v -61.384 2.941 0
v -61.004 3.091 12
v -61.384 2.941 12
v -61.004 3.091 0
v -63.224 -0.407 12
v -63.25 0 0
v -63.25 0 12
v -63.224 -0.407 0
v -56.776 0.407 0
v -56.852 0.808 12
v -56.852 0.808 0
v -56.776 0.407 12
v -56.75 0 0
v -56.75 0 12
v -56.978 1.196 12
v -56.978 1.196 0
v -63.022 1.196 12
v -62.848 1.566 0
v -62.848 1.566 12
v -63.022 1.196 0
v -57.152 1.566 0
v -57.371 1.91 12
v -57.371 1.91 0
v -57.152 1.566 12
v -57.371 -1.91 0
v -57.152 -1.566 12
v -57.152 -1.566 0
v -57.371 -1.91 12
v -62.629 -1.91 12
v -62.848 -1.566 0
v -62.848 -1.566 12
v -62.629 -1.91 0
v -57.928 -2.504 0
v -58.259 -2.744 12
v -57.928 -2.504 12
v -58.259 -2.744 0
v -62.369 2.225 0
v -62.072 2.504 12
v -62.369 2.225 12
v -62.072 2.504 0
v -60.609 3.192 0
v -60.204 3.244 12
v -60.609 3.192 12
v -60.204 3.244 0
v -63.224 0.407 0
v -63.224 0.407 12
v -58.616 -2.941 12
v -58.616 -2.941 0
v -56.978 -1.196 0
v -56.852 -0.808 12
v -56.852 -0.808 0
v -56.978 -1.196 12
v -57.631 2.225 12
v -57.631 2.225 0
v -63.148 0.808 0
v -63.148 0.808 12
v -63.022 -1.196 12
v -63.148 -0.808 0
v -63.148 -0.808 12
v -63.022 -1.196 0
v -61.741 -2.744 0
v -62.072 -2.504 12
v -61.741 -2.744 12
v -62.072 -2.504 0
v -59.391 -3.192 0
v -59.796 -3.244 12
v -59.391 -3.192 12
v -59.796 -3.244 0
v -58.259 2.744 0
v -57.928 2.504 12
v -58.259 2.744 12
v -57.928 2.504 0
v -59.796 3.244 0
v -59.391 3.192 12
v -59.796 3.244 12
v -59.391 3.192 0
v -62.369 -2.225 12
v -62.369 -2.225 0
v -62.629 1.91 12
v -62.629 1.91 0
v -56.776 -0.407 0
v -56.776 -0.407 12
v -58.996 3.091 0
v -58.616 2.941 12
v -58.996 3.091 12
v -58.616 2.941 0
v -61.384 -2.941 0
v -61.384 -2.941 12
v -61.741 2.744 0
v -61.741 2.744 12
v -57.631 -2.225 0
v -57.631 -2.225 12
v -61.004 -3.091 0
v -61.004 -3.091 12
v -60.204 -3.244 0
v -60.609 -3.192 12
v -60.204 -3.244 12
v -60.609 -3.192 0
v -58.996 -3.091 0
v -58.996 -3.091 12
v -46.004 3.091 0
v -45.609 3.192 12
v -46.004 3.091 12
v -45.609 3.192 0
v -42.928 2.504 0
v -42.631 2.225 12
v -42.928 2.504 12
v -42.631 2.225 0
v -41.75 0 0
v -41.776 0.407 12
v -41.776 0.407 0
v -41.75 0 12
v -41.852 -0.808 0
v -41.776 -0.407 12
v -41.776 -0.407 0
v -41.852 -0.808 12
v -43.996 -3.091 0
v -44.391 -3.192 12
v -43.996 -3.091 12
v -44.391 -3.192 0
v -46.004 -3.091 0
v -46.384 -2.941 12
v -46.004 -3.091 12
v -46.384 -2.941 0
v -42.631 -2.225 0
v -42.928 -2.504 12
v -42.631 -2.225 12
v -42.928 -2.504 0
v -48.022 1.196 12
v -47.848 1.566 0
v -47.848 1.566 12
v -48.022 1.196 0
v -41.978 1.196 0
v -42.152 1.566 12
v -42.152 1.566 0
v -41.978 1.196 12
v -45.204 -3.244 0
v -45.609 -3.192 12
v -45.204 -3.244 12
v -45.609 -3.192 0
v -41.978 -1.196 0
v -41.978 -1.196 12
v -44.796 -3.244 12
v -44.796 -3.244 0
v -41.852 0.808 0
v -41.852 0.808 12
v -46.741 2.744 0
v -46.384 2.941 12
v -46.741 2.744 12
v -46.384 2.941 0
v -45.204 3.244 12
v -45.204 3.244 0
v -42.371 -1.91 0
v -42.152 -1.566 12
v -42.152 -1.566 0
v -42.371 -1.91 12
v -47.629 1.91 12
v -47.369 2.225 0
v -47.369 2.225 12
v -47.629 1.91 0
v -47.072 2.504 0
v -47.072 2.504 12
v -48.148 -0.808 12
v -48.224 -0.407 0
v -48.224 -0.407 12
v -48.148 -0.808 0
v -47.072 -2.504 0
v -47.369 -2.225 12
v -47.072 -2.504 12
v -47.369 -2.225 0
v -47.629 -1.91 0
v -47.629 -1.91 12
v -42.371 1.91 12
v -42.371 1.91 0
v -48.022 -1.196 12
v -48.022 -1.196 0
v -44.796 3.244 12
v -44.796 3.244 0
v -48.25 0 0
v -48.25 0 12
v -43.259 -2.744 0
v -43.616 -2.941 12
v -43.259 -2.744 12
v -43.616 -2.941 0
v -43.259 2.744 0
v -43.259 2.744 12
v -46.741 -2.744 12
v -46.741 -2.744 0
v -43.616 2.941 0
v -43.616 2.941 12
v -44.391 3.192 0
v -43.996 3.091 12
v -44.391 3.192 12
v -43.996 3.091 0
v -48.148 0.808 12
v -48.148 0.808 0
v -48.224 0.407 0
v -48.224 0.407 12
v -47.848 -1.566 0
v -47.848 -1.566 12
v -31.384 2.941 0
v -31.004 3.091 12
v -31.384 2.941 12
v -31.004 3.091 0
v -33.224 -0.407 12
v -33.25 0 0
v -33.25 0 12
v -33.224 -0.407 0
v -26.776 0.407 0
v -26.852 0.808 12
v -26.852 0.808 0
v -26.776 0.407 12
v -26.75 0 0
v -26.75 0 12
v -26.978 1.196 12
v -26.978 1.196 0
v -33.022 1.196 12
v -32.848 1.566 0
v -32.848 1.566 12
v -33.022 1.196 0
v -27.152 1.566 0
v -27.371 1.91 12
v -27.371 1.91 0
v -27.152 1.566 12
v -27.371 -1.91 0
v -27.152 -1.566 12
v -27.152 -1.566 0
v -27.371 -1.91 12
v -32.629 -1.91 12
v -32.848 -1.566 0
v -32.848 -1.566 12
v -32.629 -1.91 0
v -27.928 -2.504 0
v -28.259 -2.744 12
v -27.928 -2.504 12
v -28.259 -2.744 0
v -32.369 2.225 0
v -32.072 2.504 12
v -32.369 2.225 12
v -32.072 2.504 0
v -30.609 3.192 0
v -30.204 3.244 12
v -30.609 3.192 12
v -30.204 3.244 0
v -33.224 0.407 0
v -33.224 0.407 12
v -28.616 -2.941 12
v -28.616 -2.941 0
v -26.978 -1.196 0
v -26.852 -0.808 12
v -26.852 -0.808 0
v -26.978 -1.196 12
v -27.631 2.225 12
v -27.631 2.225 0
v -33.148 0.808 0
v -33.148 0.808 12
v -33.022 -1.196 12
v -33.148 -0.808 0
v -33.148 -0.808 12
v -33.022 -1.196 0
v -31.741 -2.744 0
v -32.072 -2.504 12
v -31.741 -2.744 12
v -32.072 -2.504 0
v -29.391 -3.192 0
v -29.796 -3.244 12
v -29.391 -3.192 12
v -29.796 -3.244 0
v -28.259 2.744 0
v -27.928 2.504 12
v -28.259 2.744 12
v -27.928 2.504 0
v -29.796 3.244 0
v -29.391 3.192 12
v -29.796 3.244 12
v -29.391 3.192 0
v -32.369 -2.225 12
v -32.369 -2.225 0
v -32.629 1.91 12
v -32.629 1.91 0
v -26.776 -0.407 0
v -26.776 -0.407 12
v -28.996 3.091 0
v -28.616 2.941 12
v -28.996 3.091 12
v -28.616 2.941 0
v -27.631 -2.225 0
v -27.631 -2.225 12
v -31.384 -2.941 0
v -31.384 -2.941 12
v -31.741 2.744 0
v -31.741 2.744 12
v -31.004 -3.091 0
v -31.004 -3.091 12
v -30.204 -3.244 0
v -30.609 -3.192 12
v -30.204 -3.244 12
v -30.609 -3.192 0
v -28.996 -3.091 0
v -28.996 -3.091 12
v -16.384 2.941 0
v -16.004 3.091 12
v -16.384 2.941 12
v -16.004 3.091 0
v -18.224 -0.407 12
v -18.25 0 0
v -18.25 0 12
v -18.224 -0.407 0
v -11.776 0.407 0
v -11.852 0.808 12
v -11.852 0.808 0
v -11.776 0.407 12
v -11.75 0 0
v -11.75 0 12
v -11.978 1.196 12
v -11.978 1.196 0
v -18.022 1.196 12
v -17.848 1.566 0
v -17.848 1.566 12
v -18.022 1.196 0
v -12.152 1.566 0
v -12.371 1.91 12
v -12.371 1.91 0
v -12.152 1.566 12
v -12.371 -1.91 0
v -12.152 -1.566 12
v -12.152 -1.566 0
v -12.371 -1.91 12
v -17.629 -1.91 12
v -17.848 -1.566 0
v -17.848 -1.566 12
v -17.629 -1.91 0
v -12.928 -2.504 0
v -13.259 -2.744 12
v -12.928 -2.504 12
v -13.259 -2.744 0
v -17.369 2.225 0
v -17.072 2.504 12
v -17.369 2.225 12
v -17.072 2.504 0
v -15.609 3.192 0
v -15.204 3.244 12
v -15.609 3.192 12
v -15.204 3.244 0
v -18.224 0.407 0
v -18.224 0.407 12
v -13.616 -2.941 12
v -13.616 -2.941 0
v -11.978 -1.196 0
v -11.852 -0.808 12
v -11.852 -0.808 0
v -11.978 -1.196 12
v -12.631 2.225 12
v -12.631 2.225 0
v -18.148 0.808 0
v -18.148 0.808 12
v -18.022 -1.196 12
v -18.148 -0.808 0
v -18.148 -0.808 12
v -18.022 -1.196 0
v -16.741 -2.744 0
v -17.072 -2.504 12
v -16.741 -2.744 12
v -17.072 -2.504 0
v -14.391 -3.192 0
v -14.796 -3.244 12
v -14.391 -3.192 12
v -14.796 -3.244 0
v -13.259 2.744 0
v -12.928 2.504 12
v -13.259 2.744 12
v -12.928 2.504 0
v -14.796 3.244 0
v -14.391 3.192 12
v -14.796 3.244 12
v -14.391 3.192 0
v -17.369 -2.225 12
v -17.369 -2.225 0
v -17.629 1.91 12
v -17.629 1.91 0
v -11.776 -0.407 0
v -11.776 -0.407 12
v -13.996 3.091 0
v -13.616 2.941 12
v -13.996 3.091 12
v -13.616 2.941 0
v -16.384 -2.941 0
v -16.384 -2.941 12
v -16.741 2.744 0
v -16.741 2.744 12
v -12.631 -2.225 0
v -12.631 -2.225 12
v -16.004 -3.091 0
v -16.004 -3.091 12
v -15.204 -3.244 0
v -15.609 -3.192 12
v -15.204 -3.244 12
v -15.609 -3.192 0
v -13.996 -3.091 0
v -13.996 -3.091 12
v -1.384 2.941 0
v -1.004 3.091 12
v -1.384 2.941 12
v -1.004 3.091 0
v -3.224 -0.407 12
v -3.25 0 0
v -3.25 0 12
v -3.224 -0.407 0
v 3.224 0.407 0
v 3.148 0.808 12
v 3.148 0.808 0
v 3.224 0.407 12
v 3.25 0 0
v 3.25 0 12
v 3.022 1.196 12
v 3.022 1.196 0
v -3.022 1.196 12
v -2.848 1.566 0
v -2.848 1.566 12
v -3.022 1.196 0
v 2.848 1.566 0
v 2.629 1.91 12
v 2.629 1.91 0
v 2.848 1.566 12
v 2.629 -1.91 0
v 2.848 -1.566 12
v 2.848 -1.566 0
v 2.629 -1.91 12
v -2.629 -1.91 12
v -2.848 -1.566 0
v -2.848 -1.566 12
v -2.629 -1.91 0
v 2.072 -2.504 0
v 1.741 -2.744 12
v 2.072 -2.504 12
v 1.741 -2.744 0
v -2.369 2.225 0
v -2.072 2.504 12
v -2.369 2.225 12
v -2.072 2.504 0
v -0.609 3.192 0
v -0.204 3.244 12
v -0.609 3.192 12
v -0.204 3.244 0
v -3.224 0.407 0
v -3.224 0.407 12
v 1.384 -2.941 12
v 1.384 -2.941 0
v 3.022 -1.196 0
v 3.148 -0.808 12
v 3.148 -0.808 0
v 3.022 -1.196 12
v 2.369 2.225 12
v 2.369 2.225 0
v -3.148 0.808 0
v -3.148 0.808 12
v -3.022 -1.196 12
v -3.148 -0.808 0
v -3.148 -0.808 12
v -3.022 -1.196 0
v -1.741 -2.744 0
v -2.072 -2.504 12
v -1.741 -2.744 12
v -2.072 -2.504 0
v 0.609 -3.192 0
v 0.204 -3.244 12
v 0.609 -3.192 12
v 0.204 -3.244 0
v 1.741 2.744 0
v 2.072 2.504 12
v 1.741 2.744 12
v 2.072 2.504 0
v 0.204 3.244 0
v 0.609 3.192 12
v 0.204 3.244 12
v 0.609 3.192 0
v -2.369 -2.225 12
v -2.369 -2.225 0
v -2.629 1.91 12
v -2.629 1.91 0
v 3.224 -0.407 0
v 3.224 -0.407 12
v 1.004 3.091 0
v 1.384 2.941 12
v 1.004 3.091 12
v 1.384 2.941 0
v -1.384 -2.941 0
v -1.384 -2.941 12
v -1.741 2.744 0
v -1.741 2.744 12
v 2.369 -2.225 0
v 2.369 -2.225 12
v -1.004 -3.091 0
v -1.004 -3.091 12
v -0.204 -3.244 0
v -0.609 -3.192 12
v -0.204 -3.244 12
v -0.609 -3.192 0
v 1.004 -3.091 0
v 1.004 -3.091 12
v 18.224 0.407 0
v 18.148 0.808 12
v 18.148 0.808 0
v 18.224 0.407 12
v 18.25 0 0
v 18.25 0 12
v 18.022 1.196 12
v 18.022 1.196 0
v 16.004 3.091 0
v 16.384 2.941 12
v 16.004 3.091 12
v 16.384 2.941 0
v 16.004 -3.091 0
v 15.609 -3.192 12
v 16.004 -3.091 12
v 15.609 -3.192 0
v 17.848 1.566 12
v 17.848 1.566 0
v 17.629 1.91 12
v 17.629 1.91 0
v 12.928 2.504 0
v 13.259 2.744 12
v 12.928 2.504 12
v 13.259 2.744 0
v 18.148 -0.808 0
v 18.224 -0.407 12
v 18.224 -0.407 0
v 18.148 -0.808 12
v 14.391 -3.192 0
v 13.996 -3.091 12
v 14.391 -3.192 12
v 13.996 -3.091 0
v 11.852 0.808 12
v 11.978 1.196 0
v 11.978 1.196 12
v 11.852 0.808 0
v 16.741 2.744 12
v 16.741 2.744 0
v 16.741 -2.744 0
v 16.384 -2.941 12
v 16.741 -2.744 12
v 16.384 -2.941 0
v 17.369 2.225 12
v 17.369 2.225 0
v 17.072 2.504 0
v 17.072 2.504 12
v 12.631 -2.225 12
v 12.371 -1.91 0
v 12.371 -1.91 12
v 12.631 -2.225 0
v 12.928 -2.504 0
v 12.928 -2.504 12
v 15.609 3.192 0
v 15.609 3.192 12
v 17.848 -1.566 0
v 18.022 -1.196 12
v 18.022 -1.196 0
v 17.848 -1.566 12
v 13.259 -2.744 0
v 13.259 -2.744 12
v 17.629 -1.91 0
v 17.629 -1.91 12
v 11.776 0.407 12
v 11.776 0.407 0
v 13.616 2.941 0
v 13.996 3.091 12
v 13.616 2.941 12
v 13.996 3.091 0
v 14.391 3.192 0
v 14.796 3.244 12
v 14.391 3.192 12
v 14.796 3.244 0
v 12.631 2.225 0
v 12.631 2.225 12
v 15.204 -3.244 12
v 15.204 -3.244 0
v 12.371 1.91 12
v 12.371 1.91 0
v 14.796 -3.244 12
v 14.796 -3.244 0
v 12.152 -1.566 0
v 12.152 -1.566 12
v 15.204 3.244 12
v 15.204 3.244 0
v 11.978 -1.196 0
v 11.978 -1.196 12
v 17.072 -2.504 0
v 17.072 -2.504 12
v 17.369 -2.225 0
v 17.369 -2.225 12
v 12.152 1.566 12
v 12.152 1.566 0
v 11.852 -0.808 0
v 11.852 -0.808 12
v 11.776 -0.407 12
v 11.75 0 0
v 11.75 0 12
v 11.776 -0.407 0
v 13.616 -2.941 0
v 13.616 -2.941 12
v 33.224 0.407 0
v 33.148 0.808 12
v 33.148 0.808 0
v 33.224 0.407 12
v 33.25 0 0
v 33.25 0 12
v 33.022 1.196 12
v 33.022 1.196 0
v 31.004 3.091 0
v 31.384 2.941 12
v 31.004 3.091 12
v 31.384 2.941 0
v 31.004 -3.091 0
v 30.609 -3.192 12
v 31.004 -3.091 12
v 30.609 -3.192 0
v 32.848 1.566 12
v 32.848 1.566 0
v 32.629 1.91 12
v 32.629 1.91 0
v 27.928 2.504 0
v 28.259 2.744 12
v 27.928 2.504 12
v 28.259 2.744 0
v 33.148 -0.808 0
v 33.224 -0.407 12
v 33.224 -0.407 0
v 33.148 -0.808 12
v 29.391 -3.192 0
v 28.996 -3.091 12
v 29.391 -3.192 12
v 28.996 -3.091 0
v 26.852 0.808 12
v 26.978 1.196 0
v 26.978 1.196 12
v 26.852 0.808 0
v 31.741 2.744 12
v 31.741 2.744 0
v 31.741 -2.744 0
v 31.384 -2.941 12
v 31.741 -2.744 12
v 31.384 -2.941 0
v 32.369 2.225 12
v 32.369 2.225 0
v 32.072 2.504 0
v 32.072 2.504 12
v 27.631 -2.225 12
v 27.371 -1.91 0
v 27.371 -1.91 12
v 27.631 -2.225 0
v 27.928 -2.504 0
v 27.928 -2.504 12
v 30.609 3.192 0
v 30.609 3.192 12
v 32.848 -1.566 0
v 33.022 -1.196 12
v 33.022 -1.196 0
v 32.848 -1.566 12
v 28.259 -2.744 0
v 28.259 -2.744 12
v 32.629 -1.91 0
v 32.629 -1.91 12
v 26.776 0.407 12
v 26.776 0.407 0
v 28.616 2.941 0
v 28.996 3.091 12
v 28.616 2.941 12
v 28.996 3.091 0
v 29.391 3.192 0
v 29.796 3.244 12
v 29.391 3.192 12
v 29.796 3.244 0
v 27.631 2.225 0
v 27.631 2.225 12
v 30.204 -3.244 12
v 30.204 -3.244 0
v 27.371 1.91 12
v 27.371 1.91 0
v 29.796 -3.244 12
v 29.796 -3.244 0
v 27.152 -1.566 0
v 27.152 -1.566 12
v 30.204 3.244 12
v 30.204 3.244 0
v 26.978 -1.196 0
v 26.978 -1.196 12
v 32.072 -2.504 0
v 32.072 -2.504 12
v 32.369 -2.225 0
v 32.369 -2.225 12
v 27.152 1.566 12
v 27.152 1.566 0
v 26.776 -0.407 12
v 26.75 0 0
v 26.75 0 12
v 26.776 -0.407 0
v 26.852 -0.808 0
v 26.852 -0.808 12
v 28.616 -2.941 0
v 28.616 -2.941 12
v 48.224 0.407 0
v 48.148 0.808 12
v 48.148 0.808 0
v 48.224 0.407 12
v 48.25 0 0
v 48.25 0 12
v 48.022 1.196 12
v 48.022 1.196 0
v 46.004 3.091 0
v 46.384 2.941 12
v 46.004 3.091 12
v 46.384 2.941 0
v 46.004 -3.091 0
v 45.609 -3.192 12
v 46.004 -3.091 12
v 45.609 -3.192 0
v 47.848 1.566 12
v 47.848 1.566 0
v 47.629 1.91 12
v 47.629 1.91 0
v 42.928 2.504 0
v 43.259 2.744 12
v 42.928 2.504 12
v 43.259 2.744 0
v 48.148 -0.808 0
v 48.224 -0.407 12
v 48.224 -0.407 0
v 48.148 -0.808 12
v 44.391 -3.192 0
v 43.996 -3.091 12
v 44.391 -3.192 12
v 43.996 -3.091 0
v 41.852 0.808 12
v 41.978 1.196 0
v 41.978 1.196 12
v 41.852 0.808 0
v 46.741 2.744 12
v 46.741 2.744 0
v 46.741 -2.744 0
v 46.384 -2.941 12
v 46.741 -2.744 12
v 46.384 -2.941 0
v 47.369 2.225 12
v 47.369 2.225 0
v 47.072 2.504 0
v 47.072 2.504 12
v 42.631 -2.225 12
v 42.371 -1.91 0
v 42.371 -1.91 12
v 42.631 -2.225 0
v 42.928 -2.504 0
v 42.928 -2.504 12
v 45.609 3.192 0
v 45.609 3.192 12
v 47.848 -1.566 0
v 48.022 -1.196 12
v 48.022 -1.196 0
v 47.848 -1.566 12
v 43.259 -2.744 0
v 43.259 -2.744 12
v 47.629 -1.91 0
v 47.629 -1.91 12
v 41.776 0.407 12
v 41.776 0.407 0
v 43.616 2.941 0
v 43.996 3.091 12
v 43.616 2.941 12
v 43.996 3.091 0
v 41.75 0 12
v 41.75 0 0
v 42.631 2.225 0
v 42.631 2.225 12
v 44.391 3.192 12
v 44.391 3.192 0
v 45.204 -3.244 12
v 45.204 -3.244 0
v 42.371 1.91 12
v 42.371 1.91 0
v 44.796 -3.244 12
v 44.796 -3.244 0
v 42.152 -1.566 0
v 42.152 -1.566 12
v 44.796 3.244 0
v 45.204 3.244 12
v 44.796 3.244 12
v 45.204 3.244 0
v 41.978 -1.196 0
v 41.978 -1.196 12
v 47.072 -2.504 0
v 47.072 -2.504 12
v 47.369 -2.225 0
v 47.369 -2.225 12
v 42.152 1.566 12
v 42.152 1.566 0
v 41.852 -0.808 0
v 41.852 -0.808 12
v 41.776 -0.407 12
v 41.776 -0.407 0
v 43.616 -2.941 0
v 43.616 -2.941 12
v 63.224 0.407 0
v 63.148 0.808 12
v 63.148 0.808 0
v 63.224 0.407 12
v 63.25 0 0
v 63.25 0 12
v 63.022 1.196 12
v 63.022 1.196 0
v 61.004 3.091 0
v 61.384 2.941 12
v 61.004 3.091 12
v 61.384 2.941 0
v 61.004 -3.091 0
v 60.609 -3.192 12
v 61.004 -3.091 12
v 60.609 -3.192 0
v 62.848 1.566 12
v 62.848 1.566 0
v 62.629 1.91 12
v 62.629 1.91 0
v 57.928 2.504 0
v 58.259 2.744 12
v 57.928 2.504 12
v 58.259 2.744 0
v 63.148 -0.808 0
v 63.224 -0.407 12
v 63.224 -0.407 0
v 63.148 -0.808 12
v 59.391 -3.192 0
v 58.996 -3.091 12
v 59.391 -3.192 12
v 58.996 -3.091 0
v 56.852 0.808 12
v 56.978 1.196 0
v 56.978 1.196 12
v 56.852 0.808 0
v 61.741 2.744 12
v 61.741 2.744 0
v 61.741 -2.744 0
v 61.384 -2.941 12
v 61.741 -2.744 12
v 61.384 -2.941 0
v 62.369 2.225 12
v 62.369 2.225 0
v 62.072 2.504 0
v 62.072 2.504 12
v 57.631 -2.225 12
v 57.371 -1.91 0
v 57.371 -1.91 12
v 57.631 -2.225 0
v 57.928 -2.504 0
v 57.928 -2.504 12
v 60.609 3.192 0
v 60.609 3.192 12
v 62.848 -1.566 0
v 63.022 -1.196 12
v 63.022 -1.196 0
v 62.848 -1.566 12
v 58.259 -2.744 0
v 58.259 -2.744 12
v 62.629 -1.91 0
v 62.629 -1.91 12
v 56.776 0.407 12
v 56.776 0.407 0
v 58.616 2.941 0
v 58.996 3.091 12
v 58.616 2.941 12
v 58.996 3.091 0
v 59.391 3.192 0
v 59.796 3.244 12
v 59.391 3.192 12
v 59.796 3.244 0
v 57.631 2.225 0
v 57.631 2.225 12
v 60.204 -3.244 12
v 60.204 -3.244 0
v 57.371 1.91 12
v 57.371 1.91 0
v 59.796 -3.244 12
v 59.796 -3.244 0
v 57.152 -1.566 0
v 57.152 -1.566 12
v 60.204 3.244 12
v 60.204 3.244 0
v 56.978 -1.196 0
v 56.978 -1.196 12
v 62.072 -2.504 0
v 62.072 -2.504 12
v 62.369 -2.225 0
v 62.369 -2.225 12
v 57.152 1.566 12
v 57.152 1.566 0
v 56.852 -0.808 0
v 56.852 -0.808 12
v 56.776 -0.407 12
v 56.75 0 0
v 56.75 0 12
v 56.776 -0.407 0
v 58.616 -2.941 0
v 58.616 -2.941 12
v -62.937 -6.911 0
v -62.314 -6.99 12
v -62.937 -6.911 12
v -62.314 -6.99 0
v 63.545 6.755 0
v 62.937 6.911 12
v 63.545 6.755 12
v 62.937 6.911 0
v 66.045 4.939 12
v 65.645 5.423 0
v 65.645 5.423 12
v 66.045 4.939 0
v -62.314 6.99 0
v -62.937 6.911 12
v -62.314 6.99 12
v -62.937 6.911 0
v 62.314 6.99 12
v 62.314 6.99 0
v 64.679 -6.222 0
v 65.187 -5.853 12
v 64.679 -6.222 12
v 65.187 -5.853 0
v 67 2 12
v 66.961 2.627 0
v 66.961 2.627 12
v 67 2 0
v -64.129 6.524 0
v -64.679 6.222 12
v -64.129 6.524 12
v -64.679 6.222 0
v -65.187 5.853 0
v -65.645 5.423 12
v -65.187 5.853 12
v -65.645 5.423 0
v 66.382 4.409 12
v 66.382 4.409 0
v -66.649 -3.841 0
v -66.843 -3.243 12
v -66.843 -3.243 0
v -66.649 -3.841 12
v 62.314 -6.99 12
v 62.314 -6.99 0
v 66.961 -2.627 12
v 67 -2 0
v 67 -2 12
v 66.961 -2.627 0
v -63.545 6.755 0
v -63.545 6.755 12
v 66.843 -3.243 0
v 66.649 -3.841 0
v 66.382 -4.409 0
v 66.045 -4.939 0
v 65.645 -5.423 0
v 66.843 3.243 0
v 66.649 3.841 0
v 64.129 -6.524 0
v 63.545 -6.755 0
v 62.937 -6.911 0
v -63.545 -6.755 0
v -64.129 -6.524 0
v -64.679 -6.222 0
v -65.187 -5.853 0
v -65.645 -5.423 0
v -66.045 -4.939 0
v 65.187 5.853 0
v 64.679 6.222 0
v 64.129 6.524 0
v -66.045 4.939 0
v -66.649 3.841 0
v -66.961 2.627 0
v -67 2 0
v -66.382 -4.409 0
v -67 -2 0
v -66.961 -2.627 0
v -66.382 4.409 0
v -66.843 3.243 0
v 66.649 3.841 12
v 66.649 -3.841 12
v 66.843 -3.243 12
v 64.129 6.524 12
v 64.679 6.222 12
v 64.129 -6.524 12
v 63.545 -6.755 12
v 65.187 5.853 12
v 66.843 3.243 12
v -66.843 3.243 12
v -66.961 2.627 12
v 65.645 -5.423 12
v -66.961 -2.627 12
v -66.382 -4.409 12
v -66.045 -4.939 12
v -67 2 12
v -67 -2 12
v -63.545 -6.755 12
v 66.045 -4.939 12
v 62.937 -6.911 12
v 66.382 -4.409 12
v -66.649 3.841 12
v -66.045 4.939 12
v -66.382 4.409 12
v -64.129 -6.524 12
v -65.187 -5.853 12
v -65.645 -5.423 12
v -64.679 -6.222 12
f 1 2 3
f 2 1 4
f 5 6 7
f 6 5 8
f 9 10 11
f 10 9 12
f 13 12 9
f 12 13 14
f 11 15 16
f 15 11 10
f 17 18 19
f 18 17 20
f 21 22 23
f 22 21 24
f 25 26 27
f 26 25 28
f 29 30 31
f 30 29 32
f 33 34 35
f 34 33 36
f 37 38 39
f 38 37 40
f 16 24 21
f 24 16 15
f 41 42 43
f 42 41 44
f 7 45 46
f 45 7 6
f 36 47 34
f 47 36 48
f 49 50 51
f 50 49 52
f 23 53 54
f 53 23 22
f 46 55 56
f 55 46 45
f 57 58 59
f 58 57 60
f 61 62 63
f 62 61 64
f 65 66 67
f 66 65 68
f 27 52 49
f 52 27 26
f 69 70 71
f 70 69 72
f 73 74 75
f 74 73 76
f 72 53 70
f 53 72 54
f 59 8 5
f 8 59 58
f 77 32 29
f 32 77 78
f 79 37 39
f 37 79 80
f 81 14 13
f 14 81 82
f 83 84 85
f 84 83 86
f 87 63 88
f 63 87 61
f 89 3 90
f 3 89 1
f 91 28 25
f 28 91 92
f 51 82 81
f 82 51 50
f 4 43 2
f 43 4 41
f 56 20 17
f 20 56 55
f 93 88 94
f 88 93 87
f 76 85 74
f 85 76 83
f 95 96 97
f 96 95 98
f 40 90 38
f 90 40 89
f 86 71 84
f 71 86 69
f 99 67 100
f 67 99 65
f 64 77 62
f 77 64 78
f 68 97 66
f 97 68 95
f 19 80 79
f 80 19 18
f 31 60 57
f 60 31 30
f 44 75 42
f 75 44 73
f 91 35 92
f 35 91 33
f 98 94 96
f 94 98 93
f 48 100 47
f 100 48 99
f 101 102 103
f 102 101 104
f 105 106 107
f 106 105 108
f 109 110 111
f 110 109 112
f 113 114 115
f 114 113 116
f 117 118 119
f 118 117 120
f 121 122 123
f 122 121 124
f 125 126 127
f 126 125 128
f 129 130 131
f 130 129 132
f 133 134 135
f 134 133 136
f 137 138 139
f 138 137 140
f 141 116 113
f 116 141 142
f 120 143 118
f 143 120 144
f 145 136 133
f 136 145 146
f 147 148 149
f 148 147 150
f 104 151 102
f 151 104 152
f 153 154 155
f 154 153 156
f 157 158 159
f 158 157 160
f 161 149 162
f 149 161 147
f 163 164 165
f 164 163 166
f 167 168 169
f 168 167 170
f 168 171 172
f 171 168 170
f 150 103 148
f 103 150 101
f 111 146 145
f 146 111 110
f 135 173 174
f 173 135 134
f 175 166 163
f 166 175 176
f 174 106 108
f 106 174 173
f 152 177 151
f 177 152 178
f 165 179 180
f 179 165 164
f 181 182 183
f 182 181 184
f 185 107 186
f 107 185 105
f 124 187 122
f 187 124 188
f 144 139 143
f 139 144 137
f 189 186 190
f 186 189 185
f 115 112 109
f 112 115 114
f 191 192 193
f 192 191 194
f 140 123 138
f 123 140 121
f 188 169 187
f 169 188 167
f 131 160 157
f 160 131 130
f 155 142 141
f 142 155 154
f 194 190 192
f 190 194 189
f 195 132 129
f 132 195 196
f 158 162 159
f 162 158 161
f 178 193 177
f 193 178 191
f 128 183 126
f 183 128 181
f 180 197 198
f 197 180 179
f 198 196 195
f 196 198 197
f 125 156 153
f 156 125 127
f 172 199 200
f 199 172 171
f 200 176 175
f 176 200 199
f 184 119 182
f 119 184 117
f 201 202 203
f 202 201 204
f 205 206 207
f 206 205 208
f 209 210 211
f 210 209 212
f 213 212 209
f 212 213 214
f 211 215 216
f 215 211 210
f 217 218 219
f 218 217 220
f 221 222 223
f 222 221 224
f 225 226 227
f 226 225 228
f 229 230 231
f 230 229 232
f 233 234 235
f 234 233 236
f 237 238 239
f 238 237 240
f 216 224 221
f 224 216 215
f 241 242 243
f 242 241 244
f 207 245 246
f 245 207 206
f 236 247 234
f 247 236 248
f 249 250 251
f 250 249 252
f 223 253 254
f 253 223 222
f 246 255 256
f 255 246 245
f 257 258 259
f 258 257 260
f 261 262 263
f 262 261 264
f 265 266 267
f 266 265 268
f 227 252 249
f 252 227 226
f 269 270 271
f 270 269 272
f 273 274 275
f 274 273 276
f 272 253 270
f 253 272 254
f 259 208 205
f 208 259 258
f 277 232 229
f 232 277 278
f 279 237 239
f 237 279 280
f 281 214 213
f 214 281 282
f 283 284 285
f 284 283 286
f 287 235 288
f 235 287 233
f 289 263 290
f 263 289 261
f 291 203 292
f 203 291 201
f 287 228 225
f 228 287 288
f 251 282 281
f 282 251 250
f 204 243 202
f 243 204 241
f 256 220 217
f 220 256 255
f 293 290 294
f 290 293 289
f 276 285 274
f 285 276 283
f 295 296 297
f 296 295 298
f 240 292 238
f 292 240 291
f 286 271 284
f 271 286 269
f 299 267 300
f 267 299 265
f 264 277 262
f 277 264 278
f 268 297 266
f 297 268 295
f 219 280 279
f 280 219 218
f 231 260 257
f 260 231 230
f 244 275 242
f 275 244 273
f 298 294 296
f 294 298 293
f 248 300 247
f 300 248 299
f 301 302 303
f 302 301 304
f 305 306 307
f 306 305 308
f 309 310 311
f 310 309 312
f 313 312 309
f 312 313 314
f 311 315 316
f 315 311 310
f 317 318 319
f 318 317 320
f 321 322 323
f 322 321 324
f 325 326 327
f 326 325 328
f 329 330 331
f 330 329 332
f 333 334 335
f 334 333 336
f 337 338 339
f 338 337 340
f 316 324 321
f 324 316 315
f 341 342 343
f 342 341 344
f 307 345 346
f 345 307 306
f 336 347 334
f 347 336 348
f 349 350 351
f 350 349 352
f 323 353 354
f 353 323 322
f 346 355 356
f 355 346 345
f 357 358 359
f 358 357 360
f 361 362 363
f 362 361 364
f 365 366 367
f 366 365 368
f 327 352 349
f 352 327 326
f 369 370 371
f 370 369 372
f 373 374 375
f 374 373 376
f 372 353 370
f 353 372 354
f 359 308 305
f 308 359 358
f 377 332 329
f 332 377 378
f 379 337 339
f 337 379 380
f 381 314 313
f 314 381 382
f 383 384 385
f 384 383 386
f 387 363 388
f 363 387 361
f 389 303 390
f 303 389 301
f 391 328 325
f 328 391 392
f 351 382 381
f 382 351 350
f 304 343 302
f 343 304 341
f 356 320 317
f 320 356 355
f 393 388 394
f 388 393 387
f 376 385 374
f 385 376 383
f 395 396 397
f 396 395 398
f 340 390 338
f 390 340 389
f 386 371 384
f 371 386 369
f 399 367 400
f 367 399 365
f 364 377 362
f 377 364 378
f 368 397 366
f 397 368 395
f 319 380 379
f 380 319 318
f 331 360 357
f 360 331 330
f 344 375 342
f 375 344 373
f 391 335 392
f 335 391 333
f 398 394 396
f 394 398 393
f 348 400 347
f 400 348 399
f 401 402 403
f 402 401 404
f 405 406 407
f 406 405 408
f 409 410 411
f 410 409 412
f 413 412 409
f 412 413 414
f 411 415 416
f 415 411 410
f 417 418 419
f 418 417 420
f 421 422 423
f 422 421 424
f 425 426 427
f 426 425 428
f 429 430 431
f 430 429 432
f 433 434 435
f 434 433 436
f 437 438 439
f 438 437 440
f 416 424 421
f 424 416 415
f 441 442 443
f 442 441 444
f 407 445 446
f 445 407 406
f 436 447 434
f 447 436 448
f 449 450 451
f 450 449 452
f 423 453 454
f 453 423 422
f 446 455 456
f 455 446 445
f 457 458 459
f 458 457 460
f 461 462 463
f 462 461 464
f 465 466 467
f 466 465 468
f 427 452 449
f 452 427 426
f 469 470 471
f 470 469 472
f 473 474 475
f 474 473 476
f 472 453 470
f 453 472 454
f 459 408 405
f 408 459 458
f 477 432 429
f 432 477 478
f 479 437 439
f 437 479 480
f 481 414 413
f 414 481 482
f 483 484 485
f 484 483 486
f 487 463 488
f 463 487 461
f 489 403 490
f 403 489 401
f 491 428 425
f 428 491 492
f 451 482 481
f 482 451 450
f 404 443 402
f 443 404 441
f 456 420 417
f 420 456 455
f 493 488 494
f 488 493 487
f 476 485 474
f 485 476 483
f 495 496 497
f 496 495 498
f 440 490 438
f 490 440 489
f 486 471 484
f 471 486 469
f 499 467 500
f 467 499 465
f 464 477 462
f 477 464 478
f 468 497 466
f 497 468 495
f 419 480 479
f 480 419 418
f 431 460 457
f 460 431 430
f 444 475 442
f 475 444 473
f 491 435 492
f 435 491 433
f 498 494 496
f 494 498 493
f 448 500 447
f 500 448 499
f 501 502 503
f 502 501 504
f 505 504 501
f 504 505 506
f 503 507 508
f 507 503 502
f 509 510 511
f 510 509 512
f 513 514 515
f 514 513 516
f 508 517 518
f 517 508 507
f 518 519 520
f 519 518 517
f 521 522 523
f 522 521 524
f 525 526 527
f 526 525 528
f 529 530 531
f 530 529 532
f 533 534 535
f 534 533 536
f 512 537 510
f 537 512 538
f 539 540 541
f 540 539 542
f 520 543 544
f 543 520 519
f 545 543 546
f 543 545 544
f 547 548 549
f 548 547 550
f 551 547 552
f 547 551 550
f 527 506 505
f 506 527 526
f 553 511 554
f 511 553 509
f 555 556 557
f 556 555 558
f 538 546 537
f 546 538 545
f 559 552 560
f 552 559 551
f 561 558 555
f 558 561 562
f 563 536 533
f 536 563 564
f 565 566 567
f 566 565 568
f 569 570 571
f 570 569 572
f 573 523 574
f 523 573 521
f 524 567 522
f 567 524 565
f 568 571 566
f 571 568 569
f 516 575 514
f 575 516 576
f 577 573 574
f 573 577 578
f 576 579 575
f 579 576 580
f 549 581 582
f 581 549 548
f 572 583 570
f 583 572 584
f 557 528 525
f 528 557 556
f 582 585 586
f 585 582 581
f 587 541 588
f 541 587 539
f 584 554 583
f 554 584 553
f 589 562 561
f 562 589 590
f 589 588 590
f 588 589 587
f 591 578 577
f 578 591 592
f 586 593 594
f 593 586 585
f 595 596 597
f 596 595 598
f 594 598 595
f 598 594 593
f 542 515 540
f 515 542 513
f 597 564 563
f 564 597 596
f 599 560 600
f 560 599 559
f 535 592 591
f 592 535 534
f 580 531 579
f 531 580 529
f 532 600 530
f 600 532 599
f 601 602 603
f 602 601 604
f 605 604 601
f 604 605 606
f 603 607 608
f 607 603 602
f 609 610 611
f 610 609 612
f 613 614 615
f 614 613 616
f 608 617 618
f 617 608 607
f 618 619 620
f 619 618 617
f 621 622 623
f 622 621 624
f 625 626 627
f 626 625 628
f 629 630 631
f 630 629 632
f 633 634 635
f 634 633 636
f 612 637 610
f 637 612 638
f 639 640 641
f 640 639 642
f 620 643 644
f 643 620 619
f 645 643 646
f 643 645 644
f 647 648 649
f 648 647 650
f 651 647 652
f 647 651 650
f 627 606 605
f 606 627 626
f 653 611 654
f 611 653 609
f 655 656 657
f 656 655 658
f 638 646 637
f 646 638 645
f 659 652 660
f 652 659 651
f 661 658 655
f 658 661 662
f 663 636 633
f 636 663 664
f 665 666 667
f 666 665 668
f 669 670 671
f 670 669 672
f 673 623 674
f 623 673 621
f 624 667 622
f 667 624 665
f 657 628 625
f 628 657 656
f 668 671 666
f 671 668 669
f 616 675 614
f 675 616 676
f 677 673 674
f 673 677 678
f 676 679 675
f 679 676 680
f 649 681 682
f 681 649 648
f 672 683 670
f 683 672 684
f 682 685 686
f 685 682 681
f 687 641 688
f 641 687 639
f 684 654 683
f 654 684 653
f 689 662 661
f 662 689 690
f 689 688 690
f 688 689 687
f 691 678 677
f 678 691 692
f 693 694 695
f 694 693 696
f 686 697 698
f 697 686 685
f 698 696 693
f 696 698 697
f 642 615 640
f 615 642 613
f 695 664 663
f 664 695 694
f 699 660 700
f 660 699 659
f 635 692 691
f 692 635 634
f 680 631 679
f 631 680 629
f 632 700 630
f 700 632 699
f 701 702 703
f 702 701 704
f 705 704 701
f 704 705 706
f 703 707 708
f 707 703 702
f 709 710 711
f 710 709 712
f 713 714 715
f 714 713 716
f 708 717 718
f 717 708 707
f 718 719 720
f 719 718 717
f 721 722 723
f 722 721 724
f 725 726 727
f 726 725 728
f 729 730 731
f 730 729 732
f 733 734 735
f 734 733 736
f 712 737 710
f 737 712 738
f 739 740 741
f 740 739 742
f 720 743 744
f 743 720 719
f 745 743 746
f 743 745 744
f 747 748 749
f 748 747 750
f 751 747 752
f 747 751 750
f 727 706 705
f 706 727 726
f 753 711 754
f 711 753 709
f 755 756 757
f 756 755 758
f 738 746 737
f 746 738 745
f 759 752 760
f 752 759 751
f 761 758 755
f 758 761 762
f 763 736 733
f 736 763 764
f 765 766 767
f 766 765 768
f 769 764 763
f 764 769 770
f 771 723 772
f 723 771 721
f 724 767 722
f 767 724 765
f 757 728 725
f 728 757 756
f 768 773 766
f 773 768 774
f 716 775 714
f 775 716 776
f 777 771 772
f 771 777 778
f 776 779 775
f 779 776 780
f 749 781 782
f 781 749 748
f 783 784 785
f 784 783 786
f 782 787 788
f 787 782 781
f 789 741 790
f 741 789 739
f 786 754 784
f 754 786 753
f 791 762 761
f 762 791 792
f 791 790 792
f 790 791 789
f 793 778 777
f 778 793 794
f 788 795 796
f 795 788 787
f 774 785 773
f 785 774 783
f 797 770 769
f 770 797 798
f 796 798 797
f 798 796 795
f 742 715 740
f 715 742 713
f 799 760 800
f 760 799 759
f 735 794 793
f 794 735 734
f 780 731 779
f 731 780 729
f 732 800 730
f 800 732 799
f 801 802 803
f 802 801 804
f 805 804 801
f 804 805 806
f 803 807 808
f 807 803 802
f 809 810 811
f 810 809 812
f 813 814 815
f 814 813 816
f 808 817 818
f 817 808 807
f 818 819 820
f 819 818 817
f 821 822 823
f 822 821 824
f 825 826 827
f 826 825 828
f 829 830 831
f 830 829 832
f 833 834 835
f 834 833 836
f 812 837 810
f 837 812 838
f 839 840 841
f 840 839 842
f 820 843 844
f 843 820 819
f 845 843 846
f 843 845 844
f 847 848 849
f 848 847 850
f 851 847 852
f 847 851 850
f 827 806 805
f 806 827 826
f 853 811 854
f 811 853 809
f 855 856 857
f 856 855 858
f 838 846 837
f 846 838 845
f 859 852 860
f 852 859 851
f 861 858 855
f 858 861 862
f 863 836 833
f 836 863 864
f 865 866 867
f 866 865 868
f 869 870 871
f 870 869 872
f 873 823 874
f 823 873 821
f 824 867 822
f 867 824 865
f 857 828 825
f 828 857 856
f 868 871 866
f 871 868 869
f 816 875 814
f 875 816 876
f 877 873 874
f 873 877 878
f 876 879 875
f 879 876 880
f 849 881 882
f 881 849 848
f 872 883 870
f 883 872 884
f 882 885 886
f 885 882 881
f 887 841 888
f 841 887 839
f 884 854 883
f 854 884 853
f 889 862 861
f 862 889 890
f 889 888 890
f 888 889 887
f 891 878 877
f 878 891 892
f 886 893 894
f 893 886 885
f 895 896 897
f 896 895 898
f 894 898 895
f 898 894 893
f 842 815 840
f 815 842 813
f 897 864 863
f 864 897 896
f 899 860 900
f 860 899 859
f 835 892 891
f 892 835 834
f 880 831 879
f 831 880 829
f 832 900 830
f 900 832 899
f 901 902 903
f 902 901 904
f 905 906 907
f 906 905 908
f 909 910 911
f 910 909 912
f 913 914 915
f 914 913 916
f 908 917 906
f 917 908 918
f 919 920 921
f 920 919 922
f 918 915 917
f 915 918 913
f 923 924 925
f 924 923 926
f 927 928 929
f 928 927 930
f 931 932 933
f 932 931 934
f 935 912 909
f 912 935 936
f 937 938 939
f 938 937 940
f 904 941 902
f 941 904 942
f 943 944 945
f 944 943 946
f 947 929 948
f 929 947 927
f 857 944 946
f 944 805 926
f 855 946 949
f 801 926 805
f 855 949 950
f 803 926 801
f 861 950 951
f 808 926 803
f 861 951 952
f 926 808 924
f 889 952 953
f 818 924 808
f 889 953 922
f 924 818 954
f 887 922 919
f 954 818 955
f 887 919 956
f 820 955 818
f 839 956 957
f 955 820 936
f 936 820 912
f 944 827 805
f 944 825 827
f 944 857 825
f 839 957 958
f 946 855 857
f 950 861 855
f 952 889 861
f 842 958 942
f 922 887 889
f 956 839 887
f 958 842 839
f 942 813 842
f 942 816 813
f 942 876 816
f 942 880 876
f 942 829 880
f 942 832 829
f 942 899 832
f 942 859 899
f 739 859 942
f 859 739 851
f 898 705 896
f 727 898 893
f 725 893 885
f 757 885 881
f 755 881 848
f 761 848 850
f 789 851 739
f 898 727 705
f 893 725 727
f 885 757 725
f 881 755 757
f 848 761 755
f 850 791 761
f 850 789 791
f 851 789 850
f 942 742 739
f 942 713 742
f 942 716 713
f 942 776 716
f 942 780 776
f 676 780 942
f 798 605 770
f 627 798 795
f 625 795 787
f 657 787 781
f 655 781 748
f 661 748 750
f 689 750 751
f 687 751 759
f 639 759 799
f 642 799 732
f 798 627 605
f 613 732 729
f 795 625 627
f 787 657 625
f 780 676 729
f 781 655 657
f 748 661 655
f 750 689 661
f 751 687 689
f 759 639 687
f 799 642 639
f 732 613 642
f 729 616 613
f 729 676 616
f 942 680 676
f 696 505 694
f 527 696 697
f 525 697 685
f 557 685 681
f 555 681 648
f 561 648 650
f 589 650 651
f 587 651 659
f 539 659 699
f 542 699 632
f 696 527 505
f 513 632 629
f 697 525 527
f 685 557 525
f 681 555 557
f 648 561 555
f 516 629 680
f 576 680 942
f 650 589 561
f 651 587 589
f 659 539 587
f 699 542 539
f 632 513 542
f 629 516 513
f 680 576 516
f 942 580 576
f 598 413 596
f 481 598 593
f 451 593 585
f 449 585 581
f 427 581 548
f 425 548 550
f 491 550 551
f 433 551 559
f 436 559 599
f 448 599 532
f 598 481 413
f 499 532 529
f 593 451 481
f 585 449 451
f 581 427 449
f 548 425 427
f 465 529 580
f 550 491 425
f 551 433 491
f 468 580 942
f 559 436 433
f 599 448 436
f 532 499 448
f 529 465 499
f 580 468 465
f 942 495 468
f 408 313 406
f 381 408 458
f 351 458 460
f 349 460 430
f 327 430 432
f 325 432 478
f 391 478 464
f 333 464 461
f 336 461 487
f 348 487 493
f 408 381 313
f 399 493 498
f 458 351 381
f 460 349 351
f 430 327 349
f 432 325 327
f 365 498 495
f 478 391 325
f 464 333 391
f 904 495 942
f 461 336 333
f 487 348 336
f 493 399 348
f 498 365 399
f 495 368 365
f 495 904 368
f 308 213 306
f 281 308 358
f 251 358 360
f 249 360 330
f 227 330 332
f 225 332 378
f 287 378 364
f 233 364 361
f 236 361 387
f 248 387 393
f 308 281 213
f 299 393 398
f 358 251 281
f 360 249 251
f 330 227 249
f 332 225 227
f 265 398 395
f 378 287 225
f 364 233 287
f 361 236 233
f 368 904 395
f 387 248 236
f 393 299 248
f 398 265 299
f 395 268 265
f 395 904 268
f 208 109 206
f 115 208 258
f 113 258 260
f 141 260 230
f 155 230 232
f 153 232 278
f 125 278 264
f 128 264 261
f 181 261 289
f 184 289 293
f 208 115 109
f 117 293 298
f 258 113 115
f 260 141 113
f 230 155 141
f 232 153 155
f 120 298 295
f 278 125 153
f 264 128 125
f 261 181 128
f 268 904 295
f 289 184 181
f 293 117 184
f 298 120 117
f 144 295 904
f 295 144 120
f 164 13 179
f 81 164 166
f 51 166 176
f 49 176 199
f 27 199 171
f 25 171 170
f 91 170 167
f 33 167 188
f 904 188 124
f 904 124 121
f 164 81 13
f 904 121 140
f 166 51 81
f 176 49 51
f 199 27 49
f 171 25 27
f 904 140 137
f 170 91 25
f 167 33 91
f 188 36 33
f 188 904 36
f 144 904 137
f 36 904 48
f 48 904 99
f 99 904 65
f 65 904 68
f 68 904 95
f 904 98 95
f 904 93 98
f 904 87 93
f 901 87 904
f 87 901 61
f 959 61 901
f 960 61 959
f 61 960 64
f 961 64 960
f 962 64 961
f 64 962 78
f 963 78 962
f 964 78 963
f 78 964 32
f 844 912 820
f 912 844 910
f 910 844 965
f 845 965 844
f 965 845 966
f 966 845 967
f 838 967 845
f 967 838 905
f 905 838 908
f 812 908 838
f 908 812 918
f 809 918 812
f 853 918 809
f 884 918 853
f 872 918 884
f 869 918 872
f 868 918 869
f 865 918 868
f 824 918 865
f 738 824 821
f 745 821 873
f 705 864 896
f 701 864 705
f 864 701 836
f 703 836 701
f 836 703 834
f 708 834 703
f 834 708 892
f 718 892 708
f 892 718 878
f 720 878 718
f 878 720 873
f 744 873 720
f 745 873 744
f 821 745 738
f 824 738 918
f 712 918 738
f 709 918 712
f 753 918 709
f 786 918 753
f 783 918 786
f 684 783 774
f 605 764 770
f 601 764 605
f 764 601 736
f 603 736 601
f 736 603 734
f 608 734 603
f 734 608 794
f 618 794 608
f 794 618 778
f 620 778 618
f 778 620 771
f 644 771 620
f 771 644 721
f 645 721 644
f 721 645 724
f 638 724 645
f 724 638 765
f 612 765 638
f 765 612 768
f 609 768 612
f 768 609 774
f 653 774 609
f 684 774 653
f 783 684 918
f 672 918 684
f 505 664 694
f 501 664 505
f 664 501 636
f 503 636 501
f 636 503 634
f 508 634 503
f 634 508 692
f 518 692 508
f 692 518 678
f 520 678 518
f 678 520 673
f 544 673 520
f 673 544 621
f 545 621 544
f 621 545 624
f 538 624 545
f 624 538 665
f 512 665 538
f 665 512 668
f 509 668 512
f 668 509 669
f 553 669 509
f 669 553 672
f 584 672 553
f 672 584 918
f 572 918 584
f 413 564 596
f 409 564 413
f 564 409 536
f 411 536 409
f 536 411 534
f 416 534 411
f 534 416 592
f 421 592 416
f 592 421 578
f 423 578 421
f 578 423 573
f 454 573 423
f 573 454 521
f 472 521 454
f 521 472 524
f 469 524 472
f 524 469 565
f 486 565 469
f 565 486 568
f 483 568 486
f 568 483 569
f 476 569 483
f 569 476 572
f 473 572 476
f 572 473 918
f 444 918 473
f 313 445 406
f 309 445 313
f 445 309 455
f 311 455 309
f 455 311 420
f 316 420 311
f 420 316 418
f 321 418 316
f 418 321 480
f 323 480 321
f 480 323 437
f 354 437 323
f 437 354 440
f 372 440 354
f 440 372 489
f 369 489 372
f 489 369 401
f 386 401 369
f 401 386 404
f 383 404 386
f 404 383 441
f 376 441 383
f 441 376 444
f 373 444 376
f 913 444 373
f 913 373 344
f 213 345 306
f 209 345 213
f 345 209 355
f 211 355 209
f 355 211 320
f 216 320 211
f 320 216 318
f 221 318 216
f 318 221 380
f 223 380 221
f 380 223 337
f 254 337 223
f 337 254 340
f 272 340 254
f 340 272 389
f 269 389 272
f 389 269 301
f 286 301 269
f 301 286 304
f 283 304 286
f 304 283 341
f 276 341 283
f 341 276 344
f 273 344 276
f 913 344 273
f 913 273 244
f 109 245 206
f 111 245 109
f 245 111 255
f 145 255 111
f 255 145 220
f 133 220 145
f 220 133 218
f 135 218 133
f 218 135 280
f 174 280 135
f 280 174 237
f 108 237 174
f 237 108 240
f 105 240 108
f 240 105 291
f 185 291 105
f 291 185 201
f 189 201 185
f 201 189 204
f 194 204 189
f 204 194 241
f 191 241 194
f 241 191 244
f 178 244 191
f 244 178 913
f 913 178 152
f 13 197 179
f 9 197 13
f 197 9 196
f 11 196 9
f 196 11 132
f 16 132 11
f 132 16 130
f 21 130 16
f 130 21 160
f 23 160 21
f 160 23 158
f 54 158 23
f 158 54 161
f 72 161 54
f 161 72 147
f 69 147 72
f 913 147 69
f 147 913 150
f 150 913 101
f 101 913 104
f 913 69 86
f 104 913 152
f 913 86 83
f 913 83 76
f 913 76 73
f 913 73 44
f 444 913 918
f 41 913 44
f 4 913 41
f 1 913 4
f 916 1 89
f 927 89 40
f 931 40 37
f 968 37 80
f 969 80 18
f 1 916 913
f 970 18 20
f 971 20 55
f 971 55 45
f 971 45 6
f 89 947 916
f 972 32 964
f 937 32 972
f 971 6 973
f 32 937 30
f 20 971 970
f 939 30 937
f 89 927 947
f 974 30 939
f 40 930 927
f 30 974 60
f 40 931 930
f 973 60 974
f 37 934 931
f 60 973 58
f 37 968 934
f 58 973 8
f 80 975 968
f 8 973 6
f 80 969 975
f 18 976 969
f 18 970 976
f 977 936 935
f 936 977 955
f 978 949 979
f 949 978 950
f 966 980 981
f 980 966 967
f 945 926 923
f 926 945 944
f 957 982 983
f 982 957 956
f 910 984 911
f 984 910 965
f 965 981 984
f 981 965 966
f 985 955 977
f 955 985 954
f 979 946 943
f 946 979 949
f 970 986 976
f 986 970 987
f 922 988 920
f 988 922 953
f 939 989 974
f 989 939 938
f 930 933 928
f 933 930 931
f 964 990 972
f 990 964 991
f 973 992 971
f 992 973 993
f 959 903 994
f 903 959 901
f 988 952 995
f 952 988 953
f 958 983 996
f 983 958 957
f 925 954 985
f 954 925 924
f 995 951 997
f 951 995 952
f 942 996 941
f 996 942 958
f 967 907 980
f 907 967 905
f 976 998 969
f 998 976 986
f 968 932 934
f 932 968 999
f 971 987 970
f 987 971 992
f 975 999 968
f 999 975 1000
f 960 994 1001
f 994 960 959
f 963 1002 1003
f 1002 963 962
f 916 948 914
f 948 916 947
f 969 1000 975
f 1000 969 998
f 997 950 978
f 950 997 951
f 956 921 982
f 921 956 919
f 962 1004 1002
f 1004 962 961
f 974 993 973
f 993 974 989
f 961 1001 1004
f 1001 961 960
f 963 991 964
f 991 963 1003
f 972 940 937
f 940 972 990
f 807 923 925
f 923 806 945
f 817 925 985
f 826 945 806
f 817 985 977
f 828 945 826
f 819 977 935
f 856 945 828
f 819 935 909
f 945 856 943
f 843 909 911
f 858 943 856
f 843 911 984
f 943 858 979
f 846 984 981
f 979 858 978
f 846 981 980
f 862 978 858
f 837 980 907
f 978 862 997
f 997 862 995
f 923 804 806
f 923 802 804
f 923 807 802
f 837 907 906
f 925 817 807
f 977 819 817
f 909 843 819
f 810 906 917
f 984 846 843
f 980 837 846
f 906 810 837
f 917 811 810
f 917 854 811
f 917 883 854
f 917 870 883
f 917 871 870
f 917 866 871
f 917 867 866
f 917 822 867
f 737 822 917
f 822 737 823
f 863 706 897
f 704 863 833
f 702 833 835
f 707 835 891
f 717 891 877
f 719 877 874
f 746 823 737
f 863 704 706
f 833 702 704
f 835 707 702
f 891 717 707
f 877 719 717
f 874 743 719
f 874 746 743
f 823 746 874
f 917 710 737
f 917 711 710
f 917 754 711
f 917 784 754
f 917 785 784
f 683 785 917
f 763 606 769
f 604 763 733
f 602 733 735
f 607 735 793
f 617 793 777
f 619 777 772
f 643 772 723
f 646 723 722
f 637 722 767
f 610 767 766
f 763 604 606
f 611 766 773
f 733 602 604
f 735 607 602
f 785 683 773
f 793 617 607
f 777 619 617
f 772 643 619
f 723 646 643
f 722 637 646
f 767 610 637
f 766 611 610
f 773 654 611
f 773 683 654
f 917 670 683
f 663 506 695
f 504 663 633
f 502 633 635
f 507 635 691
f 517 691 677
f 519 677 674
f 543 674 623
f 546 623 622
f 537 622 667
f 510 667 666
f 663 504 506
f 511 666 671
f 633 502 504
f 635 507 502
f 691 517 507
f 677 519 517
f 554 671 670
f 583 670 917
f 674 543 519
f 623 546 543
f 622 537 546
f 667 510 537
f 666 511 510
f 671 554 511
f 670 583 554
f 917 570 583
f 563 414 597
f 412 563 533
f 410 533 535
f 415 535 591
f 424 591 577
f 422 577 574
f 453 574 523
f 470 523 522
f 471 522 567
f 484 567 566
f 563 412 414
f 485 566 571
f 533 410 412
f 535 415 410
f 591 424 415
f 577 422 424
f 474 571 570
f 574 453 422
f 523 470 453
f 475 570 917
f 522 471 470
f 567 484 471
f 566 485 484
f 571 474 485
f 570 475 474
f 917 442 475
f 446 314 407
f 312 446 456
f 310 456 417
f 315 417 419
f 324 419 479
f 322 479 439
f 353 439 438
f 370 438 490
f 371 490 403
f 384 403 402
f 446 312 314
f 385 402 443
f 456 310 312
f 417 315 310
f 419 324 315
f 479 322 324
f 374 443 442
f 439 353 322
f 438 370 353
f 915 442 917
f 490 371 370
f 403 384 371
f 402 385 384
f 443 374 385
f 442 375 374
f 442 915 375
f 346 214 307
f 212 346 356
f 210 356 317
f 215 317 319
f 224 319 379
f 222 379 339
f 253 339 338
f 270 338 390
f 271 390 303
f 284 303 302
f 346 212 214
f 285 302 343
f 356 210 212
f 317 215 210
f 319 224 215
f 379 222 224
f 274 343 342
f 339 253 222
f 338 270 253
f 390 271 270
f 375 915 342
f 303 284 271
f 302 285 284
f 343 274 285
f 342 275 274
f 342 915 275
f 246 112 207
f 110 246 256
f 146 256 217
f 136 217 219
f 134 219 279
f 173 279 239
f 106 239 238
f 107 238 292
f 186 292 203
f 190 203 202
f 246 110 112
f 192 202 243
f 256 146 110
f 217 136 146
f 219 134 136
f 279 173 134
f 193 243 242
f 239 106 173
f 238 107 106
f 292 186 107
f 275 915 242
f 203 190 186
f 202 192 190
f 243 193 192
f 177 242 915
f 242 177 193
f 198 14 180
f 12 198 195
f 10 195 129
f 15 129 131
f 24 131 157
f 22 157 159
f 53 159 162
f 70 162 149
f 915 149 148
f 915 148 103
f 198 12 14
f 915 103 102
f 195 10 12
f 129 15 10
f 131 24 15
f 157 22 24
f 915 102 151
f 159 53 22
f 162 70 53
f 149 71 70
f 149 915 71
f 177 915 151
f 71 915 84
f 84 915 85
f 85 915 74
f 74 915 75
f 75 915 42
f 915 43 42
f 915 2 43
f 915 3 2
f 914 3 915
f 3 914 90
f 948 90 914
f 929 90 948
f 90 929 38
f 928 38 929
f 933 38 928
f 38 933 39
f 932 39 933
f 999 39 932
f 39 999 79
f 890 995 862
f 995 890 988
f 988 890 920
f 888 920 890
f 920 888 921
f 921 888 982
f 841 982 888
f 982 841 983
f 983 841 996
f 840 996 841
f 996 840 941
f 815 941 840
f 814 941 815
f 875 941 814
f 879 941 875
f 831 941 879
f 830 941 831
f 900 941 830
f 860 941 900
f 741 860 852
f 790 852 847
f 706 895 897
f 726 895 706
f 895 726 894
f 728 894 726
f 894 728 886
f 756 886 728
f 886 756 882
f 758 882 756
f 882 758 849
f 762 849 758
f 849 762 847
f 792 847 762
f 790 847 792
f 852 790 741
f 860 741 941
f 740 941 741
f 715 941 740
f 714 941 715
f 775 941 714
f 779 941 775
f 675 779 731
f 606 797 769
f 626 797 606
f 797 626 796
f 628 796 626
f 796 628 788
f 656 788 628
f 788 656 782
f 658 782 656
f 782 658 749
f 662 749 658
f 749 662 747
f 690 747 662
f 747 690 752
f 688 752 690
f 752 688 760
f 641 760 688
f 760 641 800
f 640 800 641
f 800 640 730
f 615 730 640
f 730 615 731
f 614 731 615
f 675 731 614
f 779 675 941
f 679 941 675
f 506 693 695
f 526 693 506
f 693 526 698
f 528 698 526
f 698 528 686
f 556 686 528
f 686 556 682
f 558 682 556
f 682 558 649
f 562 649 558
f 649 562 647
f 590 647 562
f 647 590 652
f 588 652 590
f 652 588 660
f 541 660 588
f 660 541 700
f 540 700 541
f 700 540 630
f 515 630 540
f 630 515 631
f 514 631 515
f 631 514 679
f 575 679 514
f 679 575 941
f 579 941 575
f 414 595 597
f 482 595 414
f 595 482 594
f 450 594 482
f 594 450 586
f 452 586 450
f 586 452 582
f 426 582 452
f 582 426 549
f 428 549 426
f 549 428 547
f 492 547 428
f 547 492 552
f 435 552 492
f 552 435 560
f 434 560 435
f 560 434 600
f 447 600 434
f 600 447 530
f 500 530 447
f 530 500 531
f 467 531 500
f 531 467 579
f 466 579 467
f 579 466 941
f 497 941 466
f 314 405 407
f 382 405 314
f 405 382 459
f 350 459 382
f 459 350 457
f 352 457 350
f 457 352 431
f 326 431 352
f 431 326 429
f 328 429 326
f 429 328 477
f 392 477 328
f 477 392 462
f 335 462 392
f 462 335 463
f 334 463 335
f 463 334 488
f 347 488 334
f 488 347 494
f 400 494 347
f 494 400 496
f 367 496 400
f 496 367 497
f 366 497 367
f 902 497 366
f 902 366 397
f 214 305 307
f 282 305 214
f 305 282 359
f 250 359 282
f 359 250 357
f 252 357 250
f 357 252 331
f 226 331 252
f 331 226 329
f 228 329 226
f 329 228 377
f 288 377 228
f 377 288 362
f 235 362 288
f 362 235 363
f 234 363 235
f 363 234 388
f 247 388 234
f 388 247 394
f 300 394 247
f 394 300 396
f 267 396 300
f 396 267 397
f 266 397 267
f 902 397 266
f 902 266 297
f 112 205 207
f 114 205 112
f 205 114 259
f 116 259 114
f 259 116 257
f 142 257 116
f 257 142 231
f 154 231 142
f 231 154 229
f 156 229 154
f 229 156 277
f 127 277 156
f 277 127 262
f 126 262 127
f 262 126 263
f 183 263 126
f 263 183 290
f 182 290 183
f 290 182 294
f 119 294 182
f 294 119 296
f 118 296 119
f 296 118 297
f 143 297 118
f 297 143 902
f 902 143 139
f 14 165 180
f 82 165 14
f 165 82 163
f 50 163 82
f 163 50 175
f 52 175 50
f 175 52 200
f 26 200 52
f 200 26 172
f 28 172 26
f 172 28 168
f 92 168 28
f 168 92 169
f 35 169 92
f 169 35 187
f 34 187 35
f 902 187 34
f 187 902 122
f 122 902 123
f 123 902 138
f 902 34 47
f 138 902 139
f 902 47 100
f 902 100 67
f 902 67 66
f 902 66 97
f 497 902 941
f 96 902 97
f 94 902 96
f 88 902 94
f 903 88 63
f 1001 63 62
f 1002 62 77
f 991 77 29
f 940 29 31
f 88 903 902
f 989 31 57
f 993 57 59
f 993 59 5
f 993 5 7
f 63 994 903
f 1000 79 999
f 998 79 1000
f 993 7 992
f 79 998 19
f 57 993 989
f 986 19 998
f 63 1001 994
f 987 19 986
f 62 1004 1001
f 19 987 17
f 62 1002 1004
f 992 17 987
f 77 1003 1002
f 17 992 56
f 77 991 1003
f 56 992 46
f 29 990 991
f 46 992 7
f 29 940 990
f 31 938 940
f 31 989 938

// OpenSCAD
$fn = 50;


difference() {
	union() {
		hull() {
			translate(v = [-62.0000000000, 2.0000000000, 0]) {
				cylinder(h = 12, r = 5);
			}
			translate(v = [62.0000000000, 2.0000000000, 0]) {
				cylinder(h = 12, r = 5);
			}
			translate(v = [-62.0000000000, -2.0000000000, 0]) {
				cylinder(h = 12, r = 5);
			}
			translate(v = [62.0000000000, -2.0000000000, 0]) {
				cylinder(h = 12, r = 5);
			}
		}
	}
	union() {
		translate(v = [-60.0000000000, 0.0000000000, 0]) {
			translate(v = [0, 0, -100]) {
				cylinder(h = 200, r = 3.2500000000);
			}
		}
		translate(v = [-45.0000000000, 0.0000000000, 0]) {
			translate(v = [0, 0, -100]) {
				cylinder(h = 200, r = 3.2500000000);
			}
		}
		translate(v = [-30.0000000000, 0.0000000000, 0]) {
			translate(v = [0, 0, -100]) {
				cylinder(h = 200, r = 3.2500000000);
			}
		}
		translate(v = [-15.0000000000, 0.0000000000, 0]) {
			translate(v = [0, 0, -100]) {
				cylinder(h = 200, r = 3.2500000000);
			}
		}
		translate(v = [0, 0, -100]) {
			cylinder(h = 200, r = 3.2500000000);
		}
		translate(v = [15.0000000000, 0.0000000000, 0]) {
			translate(v = [0, 0, -100]) {
				cylinder(h = 200, r = 3.2500000000);
			}
		}
		translate(v = [30.0000000000, 0.0000000000, 0]) {
			translate(v = [0, 0, -100]) {
				cylinder(h = 200, r = 3.2500000000);
			}
		}
		translate(v = [45.0000000000, 0.0000000000, 0]) {
			translate(v = [0, 0, -100]) {
				cylinder(h = 200, r = 3.2500000000);
			}
		}
		translate(v = [60.0000000000, 0.0000000000, 0]) {
			translate(v = [0, 0, -100]) {
				cylinder(h = 200, r = 3.2500000000);
			}
		}
	}
}
